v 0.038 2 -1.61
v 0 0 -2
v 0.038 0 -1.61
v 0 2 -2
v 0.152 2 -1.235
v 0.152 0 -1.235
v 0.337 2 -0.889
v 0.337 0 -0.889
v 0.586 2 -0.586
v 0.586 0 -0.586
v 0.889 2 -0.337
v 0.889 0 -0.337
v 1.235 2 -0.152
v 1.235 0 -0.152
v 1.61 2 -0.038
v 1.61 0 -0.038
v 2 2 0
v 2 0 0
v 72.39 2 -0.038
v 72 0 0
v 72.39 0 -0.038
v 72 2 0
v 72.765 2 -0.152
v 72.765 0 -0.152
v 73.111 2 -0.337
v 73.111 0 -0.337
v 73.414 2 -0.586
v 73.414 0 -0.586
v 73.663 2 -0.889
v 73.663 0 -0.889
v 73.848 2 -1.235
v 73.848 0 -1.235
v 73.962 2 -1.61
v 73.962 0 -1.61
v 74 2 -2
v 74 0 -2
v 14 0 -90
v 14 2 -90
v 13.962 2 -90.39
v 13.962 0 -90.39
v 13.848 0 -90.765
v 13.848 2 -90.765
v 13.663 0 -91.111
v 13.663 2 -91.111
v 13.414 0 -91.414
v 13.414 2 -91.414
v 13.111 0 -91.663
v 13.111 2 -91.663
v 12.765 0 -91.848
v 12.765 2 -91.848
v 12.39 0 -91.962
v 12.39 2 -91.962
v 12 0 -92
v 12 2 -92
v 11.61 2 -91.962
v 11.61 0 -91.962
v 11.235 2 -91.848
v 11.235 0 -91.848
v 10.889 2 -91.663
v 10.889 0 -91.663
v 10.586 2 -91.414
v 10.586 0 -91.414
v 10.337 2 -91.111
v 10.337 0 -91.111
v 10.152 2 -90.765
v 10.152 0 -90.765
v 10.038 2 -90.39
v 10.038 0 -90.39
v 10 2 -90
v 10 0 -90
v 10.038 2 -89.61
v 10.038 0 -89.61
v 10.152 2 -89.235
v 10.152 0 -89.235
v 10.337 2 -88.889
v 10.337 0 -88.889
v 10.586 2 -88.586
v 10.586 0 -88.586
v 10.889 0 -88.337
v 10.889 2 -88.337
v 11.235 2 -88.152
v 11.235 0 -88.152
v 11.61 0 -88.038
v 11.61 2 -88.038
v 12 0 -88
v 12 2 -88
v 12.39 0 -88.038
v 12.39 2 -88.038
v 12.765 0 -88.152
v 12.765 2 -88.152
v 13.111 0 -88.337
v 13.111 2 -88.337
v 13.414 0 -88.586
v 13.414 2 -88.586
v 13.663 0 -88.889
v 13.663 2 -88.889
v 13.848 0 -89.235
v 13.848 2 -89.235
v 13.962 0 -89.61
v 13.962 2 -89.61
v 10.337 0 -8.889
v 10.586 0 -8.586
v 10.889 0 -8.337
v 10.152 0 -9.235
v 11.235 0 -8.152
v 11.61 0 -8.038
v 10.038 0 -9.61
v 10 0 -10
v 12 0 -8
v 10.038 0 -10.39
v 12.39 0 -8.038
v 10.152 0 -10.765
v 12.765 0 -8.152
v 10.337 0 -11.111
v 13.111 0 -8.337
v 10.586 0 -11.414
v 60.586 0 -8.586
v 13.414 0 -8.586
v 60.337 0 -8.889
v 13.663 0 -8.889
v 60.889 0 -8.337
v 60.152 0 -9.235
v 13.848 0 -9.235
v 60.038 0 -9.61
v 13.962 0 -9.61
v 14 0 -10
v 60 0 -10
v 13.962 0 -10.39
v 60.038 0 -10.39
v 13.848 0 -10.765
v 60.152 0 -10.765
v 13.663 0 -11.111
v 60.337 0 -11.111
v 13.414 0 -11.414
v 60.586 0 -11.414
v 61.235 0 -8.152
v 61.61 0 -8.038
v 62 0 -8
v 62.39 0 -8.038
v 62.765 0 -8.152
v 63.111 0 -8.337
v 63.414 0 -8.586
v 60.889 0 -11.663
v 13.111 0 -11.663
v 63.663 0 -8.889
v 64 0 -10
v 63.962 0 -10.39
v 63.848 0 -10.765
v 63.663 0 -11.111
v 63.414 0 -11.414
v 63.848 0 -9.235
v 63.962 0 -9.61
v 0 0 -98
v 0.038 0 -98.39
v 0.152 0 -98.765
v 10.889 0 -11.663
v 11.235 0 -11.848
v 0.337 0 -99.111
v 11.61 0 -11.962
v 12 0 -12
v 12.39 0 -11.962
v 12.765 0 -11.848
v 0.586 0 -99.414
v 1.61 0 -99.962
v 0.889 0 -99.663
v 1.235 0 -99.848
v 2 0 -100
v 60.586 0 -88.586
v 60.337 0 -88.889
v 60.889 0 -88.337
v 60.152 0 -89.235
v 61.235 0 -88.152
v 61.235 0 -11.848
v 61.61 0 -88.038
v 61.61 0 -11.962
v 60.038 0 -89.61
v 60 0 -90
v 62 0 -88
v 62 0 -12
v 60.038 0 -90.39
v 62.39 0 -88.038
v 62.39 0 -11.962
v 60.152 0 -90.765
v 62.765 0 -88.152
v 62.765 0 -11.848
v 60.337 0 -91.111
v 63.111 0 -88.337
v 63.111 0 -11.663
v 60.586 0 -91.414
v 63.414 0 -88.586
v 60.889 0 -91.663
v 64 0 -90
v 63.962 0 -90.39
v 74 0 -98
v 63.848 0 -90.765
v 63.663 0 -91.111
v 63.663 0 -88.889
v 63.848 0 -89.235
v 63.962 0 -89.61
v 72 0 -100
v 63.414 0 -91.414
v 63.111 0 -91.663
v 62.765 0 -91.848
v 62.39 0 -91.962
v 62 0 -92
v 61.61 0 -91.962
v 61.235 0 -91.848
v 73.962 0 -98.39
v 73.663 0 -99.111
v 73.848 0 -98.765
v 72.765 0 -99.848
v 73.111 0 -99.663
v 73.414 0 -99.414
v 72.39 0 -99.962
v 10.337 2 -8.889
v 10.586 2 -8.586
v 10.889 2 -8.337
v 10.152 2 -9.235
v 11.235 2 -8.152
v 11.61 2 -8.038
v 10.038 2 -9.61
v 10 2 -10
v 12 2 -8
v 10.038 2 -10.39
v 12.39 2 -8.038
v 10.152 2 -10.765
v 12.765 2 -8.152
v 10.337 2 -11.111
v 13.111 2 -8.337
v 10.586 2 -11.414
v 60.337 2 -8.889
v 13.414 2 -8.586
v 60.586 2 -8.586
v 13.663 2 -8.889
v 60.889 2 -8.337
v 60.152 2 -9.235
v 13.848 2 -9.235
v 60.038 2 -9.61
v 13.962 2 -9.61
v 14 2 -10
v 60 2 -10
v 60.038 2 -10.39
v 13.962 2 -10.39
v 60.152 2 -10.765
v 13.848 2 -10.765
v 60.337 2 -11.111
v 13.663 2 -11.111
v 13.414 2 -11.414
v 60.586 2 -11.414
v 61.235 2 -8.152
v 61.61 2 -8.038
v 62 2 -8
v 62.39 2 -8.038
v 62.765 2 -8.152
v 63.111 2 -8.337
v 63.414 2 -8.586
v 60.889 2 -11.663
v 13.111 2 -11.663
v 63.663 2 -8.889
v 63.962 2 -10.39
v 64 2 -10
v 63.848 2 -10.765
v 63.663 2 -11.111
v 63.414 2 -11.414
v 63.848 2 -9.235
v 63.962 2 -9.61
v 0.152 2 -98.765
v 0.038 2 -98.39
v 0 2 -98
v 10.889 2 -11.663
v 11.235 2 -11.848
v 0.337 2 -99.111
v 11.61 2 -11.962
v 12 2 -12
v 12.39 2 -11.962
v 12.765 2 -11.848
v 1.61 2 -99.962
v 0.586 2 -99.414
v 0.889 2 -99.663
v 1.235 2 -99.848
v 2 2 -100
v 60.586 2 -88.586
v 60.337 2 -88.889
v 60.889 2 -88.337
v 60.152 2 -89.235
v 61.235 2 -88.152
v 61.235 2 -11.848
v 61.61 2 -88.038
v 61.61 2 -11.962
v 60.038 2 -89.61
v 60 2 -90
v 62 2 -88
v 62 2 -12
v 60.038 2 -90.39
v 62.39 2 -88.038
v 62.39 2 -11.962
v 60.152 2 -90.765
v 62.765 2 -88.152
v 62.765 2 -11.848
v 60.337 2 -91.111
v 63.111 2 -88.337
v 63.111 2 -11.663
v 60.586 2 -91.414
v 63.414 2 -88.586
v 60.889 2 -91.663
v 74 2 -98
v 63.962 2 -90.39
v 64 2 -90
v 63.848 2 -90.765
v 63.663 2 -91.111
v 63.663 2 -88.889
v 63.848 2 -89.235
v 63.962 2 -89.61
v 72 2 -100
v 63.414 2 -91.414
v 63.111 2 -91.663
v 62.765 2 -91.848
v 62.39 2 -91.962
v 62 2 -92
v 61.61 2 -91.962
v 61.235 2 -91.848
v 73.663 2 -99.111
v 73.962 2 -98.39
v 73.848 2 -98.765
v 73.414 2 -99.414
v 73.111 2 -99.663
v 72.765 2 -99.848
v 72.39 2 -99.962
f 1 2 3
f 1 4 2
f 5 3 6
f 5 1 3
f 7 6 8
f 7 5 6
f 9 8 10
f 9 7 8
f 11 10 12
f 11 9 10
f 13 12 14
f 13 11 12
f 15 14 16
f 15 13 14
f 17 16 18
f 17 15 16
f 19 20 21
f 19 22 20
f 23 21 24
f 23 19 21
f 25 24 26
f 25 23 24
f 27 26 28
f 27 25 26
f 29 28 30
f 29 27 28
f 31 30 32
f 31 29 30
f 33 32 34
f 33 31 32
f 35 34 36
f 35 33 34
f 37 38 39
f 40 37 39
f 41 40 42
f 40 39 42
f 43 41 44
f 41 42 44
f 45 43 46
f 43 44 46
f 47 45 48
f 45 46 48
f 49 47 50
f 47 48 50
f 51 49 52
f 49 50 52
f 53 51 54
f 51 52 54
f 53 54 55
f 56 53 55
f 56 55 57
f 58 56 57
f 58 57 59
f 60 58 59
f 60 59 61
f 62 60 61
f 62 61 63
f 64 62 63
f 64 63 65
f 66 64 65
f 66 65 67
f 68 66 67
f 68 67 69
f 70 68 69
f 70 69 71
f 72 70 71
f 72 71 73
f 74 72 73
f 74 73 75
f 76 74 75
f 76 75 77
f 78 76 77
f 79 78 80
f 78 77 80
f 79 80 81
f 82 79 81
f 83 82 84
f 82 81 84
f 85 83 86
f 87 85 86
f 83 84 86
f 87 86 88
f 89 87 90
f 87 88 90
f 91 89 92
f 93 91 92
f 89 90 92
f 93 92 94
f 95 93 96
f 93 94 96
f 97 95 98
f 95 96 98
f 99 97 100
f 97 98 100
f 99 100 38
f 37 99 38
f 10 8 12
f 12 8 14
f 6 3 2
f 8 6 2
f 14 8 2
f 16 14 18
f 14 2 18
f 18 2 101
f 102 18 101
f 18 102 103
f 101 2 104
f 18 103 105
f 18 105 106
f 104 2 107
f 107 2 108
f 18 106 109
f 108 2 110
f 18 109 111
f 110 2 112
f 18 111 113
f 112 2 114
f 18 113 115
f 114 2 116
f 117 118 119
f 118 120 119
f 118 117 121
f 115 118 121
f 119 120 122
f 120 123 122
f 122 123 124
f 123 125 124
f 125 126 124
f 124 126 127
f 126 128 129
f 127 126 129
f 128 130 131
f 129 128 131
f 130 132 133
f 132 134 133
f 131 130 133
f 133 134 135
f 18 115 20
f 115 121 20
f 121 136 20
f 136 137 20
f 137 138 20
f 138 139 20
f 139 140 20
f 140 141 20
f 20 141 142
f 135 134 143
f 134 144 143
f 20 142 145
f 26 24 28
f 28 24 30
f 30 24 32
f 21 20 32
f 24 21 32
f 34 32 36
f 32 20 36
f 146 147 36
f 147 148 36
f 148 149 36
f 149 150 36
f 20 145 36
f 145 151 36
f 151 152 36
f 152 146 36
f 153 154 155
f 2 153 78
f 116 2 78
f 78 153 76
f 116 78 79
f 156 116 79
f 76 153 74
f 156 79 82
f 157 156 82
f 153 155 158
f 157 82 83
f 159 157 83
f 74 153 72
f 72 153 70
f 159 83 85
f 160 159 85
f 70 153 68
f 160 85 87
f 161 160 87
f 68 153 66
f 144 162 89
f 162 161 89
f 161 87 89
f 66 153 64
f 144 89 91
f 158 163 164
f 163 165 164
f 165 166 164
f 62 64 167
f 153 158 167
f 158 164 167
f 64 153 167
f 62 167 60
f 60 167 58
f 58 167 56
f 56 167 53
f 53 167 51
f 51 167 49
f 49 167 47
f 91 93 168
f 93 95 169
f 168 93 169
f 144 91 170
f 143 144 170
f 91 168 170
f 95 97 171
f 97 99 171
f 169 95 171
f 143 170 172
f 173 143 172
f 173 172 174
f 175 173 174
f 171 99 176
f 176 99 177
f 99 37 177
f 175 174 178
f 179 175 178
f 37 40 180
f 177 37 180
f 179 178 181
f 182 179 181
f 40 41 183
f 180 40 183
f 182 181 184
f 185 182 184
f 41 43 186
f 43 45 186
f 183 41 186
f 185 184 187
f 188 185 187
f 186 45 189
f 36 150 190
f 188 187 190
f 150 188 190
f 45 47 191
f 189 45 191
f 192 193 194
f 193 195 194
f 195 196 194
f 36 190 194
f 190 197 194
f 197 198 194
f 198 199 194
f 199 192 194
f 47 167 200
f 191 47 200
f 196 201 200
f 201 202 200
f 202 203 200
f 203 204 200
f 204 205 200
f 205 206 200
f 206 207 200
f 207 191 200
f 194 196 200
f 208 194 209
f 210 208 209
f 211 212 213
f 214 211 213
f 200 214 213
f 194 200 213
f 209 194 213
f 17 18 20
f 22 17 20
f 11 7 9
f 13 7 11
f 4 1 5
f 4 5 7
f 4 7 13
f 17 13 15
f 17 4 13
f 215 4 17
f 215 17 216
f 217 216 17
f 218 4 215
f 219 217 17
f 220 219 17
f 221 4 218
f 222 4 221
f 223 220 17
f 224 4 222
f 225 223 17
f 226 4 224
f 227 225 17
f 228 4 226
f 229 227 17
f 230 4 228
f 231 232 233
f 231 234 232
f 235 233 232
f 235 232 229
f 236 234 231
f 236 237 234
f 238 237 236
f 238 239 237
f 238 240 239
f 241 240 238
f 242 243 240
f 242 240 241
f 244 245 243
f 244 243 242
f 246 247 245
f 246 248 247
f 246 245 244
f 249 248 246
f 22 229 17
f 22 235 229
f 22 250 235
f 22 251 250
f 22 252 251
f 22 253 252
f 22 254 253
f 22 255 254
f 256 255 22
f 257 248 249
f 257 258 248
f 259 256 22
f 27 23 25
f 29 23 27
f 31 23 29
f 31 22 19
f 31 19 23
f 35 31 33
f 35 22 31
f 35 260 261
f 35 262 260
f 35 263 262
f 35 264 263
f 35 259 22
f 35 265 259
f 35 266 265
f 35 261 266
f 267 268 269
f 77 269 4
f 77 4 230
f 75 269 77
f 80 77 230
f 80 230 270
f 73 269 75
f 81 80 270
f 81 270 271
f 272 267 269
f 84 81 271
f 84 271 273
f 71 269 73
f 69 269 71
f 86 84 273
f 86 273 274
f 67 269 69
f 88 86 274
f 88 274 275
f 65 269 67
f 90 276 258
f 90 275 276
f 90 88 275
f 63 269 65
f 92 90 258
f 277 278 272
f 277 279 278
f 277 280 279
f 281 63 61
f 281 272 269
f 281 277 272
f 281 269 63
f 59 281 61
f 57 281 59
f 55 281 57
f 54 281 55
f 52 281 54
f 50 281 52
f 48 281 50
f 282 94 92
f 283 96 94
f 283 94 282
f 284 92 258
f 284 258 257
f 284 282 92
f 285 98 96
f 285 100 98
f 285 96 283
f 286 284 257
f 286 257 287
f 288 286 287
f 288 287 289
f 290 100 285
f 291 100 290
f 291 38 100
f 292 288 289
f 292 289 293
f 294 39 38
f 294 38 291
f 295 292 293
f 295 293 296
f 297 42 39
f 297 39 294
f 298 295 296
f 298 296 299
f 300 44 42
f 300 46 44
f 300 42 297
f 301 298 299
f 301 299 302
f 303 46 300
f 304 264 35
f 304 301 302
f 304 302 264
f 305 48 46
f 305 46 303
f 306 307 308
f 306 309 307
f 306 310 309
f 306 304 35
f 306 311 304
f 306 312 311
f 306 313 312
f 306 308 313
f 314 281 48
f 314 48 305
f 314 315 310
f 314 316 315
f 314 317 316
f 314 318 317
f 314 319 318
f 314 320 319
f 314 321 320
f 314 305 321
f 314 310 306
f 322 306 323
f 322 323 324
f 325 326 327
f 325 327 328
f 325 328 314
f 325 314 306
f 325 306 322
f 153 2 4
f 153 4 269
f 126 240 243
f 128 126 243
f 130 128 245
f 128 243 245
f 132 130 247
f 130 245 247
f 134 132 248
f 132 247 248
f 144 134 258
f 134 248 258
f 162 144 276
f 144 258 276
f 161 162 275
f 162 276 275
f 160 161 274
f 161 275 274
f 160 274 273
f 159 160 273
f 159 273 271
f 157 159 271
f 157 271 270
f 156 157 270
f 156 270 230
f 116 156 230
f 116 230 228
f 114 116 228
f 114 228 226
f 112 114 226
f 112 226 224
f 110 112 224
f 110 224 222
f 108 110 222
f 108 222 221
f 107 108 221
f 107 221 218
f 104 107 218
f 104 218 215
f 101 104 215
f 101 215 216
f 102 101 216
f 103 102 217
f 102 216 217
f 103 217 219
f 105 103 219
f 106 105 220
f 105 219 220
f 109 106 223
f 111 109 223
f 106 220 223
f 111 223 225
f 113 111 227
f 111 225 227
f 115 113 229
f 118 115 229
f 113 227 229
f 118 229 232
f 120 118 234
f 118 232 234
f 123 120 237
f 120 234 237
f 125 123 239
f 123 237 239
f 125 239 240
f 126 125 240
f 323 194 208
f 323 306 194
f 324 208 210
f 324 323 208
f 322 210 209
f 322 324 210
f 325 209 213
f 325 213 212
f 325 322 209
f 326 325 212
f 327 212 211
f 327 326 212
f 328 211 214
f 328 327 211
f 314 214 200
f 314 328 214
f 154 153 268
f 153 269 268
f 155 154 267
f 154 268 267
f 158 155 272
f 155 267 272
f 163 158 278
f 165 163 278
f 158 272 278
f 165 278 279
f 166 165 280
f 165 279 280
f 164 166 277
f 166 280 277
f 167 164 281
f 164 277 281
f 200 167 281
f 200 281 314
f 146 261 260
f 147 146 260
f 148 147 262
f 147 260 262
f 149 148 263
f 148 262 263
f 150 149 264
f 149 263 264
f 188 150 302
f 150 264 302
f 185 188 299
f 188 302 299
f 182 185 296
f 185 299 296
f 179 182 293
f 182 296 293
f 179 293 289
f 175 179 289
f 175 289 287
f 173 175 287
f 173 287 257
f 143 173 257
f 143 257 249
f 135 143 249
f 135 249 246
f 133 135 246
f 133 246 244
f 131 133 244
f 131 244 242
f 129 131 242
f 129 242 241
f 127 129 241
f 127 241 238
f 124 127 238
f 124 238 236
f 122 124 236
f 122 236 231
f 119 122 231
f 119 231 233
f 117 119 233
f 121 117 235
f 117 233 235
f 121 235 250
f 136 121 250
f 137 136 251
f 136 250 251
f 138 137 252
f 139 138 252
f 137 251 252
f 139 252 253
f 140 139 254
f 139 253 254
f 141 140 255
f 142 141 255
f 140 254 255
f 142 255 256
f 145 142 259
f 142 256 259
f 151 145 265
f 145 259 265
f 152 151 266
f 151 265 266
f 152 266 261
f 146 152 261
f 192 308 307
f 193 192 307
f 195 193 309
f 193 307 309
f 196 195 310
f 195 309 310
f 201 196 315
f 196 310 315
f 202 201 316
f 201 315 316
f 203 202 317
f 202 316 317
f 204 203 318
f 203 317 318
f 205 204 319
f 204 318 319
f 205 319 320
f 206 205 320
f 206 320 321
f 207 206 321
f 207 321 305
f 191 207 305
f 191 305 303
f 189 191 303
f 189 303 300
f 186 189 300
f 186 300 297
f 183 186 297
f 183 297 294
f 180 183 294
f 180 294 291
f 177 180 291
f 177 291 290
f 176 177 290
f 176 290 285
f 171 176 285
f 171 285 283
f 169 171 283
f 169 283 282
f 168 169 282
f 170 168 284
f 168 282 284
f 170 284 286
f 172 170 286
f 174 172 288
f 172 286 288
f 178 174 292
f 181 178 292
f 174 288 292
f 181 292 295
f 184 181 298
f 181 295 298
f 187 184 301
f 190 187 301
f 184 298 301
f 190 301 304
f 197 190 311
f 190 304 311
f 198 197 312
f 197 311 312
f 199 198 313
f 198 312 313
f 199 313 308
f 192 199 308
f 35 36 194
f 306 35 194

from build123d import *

# Parameters (mm, degrees)
SKETCH1_W           = 74
SKETCH1_H           = 100
BOSS_EXTRUDE1_DEPTH = 2
FILLET1_R           = 2
SKETCH2_R           = 2
CUT_EXTRUDE1_DEPTH  = 3


with BuildPart() as part:
    # Sketch1 → Boss-Extrude1 (new body)
    with BuildSketch(Plane(origin=(0, 0, 0), x_dir=(1, 0, 0), z_dir=(0, 1, 0))):
        with Locations((37, 50)):
            Rectangle(SKETCH1_W, SKETCH1_H)
    extrude(amount=BOSS_EXTRUDE1_DEPTH)

    # Fillet1
    fillet1_edges = [part.edges().sort_by_distance(p)[0] for p in [
        (0, 1, -100),
        (74, 1, -100),
        (74, 1, 0),
        (0, 1, 0),
    ]]
    fillet(fillet1_edges, radius=FILLET1_R)

    # Sketch2 → Cut-Extrude1 (cut, through all)
    with BuildSketch(Plane(origin=(0, 2, 0), x_dir=(1, 0, 0), z_dir=(0, 1, 0))):
        with Locations((12, 90)):
            Circle(SKETCH2_R)
        with Locations((62, 90)):
            Circle(SKETCH2_R)
        with Locations((62, 10)):
            Circle(SKETCH2_R)
        with Locations((12, 10)):
            Circle(SKETCH2_R)
    extrude(amount=-CUT_EXTRUDE1_DEPTH, mode=Mode.SUBTRACT)


solid = part.part
